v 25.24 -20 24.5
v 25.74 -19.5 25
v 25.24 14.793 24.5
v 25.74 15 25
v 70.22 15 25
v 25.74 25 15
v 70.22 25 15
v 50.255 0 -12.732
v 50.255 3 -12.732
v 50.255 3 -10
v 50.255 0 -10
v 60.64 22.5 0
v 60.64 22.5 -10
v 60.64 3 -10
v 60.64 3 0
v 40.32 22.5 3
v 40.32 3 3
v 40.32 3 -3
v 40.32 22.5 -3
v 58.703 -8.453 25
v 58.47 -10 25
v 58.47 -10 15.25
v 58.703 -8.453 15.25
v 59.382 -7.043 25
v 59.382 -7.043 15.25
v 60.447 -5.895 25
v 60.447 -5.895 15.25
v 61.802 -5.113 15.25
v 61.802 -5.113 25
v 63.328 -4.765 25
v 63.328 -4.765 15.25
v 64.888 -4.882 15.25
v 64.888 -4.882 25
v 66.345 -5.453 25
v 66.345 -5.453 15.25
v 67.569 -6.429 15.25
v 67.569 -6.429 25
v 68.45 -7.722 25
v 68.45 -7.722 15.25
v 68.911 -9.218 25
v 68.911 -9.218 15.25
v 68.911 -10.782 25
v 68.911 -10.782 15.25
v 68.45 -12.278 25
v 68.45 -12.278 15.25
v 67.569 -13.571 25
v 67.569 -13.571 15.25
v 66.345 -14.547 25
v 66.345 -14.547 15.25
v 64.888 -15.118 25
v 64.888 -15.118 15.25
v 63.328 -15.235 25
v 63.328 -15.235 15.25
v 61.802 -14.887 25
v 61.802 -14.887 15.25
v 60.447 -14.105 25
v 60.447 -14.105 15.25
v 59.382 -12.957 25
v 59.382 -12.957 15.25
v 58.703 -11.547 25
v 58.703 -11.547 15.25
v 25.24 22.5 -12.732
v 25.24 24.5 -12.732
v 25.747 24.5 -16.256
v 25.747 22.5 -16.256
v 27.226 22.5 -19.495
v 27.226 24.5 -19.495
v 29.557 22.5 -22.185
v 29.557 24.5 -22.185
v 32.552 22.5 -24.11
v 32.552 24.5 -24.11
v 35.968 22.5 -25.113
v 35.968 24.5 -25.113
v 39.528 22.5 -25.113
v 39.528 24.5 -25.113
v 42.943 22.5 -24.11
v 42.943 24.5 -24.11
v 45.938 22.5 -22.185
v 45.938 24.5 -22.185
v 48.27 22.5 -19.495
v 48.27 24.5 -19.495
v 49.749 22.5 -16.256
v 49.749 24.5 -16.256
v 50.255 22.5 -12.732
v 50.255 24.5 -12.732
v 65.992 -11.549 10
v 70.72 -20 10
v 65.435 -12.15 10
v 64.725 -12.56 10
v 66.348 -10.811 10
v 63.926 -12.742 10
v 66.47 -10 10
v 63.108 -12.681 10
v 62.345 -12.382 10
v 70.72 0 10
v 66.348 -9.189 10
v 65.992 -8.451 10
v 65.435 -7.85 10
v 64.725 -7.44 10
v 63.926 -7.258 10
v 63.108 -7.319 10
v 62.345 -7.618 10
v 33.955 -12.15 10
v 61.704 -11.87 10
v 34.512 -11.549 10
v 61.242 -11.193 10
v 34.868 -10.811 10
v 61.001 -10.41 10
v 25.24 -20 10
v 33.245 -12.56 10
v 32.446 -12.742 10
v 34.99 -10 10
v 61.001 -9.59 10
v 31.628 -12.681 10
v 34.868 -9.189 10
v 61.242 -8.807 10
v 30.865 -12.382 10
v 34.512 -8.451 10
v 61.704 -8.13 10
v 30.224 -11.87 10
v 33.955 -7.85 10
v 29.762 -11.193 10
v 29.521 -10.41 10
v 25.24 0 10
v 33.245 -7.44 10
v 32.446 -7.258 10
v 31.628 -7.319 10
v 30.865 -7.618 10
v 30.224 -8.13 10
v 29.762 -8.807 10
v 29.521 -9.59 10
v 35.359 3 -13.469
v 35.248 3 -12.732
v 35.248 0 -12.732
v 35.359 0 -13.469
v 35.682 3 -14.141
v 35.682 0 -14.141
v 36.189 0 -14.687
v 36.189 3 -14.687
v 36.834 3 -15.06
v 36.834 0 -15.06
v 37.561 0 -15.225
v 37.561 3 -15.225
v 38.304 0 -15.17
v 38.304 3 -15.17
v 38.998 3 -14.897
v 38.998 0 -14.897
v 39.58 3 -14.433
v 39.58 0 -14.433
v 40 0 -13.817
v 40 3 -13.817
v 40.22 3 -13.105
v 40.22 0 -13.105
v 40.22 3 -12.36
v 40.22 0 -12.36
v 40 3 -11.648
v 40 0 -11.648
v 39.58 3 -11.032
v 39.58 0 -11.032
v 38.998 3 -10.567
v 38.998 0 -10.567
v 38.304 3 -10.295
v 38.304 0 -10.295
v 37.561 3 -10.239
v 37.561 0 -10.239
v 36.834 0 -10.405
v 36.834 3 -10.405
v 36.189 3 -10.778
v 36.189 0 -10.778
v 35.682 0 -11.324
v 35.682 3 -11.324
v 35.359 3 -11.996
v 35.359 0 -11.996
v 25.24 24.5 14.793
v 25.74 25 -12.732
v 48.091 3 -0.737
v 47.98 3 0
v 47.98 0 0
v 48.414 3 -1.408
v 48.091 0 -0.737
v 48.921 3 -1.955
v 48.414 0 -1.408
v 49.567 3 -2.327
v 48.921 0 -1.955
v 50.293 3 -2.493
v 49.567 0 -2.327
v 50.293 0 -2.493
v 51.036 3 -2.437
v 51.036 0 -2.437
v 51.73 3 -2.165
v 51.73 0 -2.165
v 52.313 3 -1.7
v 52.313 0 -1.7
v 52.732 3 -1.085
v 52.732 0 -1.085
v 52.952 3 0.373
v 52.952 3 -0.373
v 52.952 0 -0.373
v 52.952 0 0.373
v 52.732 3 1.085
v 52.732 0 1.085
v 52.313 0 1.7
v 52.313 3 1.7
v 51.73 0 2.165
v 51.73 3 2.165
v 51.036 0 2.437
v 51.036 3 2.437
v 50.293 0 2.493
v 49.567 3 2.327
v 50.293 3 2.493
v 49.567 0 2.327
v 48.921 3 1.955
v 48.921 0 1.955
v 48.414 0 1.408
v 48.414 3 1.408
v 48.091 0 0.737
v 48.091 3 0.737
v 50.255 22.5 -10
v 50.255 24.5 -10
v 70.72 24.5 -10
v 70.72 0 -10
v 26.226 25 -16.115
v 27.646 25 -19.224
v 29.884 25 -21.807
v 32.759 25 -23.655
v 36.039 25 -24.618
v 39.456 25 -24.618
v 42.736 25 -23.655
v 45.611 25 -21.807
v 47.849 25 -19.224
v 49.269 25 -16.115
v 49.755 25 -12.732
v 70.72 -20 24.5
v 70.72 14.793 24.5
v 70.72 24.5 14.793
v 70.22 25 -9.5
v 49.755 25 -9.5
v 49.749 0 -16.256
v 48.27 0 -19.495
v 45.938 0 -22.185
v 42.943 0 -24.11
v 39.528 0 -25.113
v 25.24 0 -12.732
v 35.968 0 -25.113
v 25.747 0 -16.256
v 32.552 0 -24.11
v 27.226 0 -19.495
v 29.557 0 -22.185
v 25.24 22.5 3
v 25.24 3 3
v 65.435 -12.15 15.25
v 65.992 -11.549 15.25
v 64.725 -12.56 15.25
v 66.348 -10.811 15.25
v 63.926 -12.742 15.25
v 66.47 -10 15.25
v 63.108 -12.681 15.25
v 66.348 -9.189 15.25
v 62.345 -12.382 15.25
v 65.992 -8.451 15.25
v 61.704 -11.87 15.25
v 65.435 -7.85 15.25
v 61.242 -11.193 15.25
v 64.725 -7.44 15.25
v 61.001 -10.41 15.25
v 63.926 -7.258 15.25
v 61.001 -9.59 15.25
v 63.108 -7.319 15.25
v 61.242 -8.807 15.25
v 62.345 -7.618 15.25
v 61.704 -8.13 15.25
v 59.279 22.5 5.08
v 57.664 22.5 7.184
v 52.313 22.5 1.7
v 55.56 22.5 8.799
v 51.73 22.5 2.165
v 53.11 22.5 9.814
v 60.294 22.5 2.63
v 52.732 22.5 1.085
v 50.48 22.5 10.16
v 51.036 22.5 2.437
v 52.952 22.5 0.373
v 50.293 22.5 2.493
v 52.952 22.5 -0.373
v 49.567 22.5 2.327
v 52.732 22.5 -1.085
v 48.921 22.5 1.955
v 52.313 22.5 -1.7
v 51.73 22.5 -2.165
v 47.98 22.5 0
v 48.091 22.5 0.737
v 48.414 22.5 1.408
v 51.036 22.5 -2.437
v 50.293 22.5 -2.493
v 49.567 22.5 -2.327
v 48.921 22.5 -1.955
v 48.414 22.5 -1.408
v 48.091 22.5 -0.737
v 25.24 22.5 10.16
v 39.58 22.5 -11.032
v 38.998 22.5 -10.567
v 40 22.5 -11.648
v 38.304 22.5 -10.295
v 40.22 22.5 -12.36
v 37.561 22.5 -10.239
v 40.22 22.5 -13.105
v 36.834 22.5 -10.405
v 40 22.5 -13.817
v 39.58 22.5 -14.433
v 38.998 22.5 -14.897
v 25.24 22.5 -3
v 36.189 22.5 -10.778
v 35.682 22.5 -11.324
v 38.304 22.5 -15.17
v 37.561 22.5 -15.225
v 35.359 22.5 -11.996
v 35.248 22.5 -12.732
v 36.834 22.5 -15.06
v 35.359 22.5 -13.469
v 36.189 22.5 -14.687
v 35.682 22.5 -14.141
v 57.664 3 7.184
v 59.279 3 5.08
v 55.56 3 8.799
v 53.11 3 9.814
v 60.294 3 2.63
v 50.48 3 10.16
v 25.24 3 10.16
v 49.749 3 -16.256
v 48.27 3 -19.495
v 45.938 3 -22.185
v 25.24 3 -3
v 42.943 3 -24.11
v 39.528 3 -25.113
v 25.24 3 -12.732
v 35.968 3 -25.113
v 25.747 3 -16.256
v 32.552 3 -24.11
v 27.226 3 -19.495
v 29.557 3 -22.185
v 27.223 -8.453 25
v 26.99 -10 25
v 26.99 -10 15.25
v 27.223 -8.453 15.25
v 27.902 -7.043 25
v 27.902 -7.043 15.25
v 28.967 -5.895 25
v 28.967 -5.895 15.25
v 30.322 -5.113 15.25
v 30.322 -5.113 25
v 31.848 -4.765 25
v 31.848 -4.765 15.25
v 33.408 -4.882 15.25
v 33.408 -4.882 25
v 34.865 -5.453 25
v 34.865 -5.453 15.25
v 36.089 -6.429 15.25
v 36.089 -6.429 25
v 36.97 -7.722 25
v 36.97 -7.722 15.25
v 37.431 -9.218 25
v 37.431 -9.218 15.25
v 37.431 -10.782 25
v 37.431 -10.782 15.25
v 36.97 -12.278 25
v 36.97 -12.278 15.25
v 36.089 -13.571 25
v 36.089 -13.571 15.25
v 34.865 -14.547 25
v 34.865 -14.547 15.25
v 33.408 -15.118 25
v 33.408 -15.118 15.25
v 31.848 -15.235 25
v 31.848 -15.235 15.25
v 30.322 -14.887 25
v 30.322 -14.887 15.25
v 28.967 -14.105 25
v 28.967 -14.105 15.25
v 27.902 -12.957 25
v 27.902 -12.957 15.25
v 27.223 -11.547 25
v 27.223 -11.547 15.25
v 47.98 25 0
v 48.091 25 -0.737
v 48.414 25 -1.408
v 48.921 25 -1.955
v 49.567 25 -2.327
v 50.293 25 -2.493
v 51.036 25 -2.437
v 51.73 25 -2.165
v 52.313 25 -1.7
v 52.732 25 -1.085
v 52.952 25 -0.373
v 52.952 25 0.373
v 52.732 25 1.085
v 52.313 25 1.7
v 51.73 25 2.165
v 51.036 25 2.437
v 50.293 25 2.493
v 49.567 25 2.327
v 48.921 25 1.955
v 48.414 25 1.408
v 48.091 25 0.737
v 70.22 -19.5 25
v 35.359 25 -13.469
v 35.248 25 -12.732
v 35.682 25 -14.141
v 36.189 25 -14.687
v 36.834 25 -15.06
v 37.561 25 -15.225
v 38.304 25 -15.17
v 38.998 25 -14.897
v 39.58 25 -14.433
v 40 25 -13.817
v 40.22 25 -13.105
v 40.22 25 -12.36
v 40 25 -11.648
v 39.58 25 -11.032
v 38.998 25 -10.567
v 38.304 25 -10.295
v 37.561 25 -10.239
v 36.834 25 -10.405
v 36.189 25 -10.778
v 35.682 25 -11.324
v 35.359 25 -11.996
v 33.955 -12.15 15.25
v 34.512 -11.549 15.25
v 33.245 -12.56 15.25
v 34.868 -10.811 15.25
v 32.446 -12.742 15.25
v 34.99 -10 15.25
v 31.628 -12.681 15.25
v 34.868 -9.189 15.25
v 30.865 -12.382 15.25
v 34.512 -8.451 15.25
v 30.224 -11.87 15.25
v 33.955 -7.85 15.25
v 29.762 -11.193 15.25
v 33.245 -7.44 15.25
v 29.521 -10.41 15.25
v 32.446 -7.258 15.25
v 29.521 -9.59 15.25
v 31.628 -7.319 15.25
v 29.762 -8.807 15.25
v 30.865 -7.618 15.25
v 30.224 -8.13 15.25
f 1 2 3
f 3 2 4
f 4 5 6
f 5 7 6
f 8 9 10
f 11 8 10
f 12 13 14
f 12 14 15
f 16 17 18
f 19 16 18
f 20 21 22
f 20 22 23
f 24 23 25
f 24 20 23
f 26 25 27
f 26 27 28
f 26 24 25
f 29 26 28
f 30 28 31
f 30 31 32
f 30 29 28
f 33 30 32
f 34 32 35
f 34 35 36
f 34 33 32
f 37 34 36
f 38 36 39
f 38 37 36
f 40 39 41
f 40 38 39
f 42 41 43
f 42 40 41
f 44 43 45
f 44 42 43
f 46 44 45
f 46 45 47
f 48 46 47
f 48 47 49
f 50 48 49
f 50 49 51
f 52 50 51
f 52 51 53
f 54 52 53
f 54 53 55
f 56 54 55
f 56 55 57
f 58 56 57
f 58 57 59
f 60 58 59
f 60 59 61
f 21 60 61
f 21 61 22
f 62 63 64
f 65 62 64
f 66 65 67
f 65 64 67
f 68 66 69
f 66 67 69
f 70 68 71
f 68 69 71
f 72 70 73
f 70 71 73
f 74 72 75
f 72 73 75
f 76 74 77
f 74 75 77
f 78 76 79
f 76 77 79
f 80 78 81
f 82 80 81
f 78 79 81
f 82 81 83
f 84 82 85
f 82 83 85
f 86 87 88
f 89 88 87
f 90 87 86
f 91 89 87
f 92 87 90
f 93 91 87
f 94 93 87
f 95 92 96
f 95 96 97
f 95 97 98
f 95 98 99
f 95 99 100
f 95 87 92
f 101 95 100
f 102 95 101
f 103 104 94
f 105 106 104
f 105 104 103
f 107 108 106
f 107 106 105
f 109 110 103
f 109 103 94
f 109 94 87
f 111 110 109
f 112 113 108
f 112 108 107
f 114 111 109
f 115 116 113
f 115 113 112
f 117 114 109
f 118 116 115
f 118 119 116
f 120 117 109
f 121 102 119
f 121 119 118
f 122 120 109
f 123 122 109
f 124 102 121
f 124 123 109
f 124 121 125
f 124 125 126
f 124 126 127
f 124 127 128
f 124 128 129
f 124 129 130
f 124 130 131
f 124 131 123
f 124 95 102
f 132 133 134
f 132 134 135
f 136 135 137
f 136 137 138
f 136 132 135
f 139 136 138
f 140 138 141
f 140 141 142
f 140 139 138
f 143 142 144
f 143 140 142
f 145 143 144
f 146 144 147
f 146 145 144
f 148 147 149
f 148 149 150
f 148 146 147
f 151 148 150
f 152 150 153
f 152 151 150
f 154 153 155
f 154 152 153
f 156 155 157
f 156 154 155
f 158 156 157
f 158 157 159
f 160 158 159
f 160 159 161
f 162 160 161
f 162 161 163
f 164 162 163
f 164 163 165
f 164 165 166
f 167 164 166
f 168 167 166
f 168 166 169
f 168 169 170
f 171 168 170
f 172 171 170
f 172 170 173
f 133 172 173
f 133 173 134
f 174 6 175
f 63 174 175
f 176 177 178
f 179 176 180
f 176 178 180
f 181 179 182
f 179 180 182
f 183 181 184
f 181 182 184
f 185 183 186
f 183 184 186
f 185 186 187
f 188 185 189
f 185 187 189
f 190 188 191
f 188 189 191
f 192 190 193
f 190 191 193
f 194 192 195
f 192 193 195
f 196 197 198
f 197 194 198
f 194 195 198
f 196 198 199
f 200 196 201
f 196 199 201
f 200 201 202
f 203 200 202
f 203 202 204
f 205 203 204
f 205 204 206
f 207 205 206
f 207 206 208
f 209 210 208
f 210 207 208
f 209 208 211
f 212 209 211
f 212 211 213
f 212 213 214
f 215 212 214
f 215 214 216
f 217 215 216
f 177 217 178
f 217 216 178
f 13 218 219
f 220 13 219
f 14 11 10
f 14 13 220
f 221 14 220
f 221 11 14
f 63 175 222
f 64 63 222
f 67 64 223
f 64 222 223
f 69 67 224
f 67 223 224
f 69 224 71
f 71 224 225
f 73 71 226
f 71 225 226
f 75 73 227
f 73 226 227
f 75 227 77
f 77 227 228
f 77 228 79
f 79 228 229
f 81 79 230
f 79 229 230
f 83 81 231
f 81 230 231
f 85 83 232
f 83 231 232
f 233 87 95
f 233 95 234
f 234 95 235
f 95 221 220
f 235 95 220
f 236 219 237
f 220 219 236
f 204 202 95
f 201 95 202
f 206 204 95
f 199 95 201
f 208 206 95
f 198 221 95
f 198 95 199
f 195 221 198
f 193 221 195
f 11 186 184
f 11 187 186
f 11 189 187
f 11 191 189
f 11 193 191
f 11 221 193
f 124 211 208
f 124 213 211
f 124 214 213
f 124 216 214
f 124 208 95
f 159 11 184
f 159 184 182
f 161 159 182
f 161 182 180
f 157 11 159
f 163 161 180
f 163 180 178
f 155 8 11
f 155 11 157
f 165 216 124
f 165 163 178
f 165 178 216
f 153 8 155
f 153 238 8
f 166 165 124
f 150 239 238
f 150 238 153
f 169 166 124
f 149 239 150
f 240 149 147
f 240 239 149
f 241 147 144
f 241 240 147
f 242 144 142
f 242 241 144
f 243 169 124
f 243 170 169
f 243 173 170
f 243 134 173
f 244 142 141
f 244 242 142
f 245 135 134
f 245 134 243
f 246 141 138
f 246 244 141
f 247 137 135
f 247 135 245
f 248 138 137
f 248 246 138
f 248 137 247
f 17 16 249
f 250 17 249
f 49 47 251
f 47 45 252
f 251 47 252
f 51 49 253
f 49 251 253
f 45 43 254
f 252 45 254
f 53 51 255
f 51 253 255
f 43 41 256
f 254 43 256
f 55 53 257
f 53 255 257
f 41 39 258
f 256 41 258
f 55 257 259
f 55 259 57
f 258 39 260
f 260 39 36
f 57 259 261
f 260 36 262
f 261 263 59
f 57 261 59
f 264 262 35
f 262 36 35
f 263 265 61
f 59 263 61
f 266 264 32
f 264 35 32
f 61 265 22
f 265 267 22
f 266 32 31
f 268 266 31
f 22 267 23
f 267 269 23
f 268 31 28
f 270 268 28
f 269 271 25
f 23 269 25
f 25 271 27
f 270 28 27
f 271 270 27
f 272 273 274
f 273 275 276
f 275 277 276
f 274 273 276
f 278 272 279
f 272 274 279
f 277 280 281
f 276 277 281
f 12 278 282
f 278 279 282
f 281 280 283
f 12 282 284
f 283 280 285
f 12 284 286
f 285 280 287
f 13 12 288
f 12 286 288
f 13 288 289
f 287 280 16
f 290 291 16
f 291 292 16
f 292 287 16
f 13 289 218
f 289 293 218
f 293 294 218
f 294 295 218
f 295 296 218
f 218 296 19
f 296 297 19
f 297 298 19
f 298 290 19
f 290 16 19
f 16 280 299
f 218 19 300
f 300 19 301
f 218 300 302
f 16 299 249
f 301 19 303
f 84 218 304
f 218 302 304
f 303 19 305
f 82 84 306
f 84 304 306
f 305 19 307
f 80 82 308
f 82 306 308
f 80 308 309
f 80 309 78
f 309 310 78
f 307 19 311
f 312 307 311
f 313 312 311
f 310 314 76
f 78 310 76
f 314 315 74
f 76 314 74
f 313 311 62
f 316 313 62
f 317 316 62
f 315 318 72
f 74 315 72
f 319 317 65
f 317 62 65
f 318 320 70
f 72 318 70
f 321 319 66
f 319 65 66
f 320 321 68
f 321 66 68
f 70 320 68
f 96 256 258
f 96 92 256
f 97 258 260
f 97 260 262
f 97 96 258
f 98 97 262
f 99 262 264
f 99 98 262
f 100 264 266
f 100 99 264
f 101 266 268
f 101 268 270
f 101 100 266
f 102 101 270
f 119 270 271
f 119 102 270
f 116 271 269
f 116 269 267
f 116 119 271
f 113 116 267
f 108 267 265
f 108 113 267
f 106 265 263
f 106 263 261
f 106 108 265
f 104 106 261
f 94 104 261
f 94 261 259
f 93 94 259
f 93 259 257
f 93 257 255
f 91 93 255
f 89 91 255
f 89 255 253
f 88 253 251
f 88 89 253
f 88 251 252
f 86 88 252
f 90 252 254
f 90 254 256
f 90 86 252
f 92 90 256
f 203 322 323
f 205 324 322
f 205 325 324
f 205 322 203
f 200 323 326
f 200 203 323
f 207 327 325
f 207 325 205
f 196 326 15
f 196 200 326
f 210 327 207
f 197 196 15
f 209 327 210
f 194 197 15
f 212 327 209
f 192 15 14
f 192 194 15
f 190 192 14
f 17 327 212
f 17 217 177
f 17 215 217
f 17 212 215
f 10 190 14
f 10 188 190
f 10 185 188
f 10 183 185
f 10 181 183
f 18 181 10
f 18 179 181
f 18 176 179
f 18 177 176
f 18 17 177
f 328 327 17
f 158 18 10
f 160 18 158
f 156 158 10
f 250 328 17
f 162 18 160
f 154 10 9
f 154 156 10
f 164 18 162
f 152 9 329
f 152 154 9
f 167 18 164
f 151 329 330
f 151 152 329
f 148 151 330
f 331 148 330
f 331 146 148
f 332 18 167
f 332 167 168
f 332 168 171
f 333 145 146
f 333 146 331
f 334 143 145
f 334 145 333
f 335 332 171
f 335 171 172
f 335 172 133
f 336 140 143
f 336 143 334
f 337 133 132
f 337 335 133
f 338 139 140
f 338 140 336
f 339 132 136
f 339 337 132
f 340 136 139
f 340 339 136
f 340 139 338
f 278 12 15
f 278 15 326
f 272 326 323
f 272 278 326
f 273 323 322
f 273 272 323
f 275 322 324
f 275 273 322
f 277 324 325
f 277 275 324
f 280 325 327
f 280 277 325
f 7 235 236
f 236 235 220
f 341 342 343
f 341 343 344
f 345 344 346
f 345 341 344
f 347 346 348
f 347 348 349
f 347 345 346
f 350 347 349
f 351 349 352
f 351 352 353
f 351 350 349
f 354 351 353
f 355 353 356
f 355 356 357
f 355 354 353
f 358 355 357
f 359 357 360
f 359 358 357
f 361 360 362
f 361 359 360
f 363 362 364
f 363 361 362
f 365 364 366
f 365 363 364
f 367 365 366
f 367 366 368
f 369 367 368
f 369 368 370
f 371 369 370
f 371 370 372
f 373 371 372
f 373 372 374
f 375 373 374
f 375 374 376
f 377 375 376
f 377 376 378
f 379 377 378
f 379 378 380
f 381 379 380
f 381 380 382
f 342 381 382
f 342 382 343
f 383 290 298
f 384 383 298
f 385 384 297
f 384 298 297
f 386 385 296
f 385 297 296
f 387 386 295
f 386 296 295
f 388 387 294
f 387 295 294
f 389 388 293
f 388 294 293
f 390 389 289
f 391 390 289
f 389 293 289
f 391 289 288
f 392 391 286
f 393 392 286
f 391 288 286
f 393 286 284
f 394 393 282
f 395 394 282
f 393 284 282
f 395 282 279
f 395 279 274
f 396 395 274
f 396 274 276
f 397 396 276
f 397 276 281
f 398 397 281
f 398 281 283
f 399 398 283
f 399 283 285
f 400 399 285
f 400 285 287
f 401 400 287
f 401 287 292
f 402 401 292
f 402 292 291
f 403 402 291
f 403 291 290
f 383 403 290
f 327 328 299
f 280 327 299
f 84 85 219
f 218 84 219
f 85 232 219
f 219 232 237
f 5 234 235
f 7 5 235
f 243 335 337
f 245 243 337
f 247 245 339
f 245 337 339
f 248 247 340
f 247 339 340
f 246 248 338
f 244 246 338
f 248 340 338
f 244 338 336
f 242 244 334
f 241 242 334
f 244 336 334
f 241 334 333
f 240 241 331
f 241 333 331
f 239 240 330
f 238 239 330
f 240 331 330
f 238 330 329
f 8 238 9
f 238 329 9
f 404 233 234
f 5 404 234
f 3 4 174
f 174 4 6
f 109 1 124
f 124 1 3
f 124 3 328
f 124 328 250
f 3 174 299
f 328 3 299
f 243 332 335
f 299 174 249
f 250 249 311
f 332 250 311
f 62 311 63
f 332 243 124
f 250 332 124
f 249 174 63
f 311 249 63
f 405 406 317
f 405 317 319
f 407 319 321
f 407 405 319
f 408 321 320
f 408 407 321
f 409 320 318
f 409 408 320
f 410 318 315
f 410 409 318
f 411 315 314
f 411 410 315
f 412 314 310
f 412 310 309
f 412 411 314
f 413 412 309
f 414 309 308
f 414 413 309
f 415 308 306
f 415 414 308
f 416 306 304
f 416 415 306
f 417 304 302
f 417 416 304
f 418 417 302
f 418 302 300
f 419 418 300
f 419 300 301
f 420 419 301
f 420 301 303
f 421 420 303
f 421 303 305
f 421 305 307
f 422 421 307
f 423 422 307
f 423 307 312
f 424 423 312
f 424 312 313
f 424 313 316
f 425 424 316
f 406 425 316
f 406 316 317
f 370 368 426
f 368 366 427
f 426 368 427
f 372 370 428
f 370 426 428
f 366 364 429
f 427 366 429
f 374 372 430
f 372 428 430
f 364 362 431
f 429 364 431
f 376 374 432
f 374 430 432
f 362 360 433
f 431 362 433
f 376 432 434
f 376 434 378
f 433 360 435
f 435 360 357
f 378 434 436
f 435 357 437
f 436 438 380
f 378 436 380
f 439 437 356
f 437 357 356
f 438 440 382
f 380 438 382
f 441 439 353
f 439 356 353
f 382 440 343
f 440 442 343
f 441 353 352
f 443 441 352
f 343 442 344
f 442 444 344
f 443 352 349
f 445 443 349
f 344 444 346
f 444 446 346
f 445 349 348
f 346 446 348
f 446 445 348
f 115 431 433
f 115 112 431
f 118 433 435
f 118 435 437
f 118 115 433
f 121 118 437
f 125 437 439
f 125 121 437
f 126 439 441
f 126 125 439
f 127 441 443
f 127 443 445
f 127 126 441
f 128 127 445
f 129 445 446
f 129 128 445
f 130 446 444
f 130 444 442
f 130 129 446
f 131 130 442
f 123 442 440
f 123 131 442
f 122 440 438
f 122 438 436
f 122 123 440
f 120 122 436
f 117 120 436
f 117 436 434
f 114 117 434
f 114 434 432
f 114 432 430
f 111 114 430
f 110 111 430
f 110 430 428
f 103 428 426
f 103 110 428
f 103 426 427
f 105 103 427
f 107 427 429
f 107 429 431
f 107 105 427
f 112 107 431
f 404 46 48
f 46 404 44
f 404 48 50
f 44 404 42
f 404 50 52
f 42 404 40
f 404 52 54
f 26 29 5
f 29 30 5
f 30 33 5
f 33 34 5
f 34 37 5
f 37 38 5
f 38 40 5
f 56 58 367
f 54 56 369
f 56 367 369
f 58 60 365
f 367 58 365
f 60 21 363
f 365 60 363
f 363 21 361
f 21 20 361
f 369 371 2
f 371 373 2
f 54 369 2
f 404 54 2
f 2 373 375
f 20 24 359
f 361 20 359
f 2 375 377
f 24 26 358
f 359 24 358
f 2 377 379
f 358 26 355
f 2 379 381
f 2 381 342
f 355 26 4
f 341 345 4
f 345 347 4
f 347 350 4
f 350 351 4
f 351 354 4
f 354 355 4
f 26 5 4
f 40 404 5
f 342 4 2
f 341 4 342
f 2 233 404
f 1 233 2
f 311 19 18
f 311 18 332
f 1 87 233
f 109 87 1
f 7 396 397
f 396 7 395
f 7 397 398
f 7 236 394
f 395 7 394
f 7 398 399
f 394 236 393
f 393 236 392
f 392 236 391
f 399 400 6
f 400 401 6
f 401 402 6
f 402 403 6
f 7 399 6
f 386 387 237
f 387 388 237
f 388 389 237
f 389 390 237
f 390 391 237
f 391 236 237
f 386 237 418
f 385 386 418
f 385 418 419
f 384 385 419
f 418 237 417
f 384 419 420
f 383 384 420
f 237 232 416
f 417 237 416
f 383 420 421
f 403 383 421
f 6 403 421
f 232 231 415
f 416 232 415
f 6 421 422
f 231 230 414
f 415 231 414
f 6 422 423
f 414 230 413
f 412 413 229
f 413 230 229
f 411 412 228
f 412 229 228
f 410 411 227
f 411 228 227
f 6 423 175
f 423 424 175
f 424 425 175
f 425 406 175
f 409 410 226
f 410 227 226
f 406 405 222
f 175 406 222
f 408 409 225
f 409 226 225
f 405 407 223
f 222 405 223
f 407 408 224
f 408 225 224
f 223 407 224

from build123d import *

# Parameters (mm, degrees)
SKETCH1_R                       = 2.5
BOSS_EXTRUDE1_DEPTH             = 25
SKETCH9_W                       = 45.48
SKETCH9_H                       = 45
BOSS_EXTRUDE4_DEPTH             = 15
CUT_EXTRUDE2_START              = -2.5
CUT_EXTRUDE2_DEPTH              = 19.5
SKETCH15_R                      = 2.5
BOSS_EXTRUDE5_DEPTH             = 25
CHAMFER1_SIZE                   = 10
CUT_EXTRUDE3_REACH              = 47.48
SKETCH16_W                      = 40
SKETCH16_H                      = 19.5
SKETCH17_W                      = 15.08
SKETCH17_H                      = 6
BOSS_EXTRUDE6_DEPTH             = 22
CBORE_FOR_M5_SBHCS1_D           = 5.5
CBORE_FOR_M5_SBHCS1_CBORE_D     = 10.5
CBORE_FOR_M5_SBHCS1_CBORE_DEPTH = 9.75
CHAMFER2_SIZE                   = 0.5


with BuildPart() as part:
    # Sketch1 → Boss-Extrude1 (new body)
    with BuildSketch(Plane(origin=(0, 0, 0), x_dir=(1, 0, 0), z_dir=(0, 1, 0))):
        Polygon((20.24, -10), (25.24, -10), (25.24, 10), (20.24, 10), (-20.24, 10), (-20.24, -10), align=None)
        Circle(SKETCH1_R, mode=Mode.SUBTRACT)
    extrude(amount=BOSS_EXTRUDE1_DEPTH)

    # Sketch9 → Boss-Extrude4 (add)
    with BuildSketch(Plane.XY.offset(10)):
        with Locations((2.5, 2.5)):
            Rectangle(SKETCH9_W, SKETCH9_H)
    extrude(amount=BOSS_EXTRUDE4_DEPTH)

    # Sketch10 → Cut-Extrude2 (cut)
    with BuildSketch(Plane(origin=(0, 25, 0), x_dir=(1, 0, 0), z_dir=(0, 1, 0)).offset(CUT_EXTRUDE2_START)):
        with BuildLine():
            Line((10.16, 0), (10.16, 10))
            Line((10.16, 10), (-10.16, 10))
            Line((-10.16, 10), (-10.16, 0))
            ThreePointArc((-10.16, 0), (0, -10.16), (10.16, 0))
        make_face()
    extrude(amount=-CUT_EXTRUDE2_DEPTH, mode=Mode.SUBTRACT)

    # Sketch15 → Boss-Extrude5 (add)
    with BuildSketch(Plane(origin=(0, 25, 0), x_dir=(1, 0, 0), z_dir=(0, 1, 0))):
        with BuildLine():
            Line((25.24, 10), (25.24, 12.732395665))
            ThreePointArc((25.24, 12.732395665), (12.732395665, 25.24), (0.224791329, 12.732395665))
            Line((0.224791329, 12.732395665), (0.224791329, 10))
            Line((0.224791329, 10), (25.24, 10))
        make_face()
        with Locations((12.732395665, 12.732395665)):
            Circle(SKETCH15_R, mode=Mode.SUBTRACT)
    extrude(amount=-BOSS_EXTRUDE5_DEPTH)

    # Chamfer1
    chamfer1_edges = [part.edges().sort_by_distance(p)[0] for p in [
        (2.5, 25, 25),
    ]]
    chamfer(chamfer1_edges, length=CHAMFER1_SIZE)

    # Sketch16 → Cut-Extrude3 (cut, up to next)
    with BuildSketch(Plane(origin=(25.24, 0, 0), x_dir=(0, 0, -1), z_dir=(1, 0, 0)), mode=Mode.PRIVATE) as cut_extrude3_sk1:
        with Locations((9.84, 12.75)):
            Rectangle(SKETCH16_W, SKETCH16_H)
    cut_extrude3_tool1 = extrude(cut_extrude3_sk1.sketch, amount=-CUT_EXTRUDE3_REACH, mode=Mode.PRIVATE) & part.part
    add(cut_extrude3_tool1.solids().sort_by_distance((25.24, 12.75, -9.84))[0], mode=Mode.SUBTRACT)

    # Sketch17 → Boss-Extrude6 (add)
    with BuildSketch(Plane(origin=(0, 25, 0), x_dir=(1, 0, 0), z_dir=(0, 1, 0))):
        with Locations((17.7, 0)):
            Rectangle(SKETCH17_W, SKETCH17_H)
    extrude(amount=-BOSS_EXTRUDE6_DEPTH)

    # CBORE for M5 SBHCS1 (through all)
    with Locations(Plane.XY.offset(25)):
        with Locations((-13.24, -10), (18.24, -10)):
            CounterBoreHole(CBORE_FOR_M5_SBHCS1_D / 2, CBORE_FOR_M5_SBHCS1_CBORE_D / 2, CBORE_FOR_M5_SBHCS1_CBORE_DEPTH)


with BuildPart() as body_2:
    # Mirror1: mirrored copy
    add(part.part.mirror(Plane(origin=(25.24, 25, 10), x_dir=(0, 0, 1), z_dir=(-1, 0, 0))))

    # Chamfer2
    chamfer2_edges = [body_2.edges().sort_by_distance(p)[0] for p in [
        (70.72, 25, 2.5),
        (47.98, -20, 25),
        (25.24, -2.5, 25),
        (60.487604335, 25, -10),
        (37.747604335, 25, -25.24),
        (50.255208671, 25, -11.366197832),
        (70.72, -2.5, 25),
        (70.72, 20, 20),
        (25.24, 25, 1.133802168),
        (25.24, 20, 20),
    ]]
    chamfer(chamfer2_edges, length=CHAMFER2_SIZE)


solid = body_2.part
